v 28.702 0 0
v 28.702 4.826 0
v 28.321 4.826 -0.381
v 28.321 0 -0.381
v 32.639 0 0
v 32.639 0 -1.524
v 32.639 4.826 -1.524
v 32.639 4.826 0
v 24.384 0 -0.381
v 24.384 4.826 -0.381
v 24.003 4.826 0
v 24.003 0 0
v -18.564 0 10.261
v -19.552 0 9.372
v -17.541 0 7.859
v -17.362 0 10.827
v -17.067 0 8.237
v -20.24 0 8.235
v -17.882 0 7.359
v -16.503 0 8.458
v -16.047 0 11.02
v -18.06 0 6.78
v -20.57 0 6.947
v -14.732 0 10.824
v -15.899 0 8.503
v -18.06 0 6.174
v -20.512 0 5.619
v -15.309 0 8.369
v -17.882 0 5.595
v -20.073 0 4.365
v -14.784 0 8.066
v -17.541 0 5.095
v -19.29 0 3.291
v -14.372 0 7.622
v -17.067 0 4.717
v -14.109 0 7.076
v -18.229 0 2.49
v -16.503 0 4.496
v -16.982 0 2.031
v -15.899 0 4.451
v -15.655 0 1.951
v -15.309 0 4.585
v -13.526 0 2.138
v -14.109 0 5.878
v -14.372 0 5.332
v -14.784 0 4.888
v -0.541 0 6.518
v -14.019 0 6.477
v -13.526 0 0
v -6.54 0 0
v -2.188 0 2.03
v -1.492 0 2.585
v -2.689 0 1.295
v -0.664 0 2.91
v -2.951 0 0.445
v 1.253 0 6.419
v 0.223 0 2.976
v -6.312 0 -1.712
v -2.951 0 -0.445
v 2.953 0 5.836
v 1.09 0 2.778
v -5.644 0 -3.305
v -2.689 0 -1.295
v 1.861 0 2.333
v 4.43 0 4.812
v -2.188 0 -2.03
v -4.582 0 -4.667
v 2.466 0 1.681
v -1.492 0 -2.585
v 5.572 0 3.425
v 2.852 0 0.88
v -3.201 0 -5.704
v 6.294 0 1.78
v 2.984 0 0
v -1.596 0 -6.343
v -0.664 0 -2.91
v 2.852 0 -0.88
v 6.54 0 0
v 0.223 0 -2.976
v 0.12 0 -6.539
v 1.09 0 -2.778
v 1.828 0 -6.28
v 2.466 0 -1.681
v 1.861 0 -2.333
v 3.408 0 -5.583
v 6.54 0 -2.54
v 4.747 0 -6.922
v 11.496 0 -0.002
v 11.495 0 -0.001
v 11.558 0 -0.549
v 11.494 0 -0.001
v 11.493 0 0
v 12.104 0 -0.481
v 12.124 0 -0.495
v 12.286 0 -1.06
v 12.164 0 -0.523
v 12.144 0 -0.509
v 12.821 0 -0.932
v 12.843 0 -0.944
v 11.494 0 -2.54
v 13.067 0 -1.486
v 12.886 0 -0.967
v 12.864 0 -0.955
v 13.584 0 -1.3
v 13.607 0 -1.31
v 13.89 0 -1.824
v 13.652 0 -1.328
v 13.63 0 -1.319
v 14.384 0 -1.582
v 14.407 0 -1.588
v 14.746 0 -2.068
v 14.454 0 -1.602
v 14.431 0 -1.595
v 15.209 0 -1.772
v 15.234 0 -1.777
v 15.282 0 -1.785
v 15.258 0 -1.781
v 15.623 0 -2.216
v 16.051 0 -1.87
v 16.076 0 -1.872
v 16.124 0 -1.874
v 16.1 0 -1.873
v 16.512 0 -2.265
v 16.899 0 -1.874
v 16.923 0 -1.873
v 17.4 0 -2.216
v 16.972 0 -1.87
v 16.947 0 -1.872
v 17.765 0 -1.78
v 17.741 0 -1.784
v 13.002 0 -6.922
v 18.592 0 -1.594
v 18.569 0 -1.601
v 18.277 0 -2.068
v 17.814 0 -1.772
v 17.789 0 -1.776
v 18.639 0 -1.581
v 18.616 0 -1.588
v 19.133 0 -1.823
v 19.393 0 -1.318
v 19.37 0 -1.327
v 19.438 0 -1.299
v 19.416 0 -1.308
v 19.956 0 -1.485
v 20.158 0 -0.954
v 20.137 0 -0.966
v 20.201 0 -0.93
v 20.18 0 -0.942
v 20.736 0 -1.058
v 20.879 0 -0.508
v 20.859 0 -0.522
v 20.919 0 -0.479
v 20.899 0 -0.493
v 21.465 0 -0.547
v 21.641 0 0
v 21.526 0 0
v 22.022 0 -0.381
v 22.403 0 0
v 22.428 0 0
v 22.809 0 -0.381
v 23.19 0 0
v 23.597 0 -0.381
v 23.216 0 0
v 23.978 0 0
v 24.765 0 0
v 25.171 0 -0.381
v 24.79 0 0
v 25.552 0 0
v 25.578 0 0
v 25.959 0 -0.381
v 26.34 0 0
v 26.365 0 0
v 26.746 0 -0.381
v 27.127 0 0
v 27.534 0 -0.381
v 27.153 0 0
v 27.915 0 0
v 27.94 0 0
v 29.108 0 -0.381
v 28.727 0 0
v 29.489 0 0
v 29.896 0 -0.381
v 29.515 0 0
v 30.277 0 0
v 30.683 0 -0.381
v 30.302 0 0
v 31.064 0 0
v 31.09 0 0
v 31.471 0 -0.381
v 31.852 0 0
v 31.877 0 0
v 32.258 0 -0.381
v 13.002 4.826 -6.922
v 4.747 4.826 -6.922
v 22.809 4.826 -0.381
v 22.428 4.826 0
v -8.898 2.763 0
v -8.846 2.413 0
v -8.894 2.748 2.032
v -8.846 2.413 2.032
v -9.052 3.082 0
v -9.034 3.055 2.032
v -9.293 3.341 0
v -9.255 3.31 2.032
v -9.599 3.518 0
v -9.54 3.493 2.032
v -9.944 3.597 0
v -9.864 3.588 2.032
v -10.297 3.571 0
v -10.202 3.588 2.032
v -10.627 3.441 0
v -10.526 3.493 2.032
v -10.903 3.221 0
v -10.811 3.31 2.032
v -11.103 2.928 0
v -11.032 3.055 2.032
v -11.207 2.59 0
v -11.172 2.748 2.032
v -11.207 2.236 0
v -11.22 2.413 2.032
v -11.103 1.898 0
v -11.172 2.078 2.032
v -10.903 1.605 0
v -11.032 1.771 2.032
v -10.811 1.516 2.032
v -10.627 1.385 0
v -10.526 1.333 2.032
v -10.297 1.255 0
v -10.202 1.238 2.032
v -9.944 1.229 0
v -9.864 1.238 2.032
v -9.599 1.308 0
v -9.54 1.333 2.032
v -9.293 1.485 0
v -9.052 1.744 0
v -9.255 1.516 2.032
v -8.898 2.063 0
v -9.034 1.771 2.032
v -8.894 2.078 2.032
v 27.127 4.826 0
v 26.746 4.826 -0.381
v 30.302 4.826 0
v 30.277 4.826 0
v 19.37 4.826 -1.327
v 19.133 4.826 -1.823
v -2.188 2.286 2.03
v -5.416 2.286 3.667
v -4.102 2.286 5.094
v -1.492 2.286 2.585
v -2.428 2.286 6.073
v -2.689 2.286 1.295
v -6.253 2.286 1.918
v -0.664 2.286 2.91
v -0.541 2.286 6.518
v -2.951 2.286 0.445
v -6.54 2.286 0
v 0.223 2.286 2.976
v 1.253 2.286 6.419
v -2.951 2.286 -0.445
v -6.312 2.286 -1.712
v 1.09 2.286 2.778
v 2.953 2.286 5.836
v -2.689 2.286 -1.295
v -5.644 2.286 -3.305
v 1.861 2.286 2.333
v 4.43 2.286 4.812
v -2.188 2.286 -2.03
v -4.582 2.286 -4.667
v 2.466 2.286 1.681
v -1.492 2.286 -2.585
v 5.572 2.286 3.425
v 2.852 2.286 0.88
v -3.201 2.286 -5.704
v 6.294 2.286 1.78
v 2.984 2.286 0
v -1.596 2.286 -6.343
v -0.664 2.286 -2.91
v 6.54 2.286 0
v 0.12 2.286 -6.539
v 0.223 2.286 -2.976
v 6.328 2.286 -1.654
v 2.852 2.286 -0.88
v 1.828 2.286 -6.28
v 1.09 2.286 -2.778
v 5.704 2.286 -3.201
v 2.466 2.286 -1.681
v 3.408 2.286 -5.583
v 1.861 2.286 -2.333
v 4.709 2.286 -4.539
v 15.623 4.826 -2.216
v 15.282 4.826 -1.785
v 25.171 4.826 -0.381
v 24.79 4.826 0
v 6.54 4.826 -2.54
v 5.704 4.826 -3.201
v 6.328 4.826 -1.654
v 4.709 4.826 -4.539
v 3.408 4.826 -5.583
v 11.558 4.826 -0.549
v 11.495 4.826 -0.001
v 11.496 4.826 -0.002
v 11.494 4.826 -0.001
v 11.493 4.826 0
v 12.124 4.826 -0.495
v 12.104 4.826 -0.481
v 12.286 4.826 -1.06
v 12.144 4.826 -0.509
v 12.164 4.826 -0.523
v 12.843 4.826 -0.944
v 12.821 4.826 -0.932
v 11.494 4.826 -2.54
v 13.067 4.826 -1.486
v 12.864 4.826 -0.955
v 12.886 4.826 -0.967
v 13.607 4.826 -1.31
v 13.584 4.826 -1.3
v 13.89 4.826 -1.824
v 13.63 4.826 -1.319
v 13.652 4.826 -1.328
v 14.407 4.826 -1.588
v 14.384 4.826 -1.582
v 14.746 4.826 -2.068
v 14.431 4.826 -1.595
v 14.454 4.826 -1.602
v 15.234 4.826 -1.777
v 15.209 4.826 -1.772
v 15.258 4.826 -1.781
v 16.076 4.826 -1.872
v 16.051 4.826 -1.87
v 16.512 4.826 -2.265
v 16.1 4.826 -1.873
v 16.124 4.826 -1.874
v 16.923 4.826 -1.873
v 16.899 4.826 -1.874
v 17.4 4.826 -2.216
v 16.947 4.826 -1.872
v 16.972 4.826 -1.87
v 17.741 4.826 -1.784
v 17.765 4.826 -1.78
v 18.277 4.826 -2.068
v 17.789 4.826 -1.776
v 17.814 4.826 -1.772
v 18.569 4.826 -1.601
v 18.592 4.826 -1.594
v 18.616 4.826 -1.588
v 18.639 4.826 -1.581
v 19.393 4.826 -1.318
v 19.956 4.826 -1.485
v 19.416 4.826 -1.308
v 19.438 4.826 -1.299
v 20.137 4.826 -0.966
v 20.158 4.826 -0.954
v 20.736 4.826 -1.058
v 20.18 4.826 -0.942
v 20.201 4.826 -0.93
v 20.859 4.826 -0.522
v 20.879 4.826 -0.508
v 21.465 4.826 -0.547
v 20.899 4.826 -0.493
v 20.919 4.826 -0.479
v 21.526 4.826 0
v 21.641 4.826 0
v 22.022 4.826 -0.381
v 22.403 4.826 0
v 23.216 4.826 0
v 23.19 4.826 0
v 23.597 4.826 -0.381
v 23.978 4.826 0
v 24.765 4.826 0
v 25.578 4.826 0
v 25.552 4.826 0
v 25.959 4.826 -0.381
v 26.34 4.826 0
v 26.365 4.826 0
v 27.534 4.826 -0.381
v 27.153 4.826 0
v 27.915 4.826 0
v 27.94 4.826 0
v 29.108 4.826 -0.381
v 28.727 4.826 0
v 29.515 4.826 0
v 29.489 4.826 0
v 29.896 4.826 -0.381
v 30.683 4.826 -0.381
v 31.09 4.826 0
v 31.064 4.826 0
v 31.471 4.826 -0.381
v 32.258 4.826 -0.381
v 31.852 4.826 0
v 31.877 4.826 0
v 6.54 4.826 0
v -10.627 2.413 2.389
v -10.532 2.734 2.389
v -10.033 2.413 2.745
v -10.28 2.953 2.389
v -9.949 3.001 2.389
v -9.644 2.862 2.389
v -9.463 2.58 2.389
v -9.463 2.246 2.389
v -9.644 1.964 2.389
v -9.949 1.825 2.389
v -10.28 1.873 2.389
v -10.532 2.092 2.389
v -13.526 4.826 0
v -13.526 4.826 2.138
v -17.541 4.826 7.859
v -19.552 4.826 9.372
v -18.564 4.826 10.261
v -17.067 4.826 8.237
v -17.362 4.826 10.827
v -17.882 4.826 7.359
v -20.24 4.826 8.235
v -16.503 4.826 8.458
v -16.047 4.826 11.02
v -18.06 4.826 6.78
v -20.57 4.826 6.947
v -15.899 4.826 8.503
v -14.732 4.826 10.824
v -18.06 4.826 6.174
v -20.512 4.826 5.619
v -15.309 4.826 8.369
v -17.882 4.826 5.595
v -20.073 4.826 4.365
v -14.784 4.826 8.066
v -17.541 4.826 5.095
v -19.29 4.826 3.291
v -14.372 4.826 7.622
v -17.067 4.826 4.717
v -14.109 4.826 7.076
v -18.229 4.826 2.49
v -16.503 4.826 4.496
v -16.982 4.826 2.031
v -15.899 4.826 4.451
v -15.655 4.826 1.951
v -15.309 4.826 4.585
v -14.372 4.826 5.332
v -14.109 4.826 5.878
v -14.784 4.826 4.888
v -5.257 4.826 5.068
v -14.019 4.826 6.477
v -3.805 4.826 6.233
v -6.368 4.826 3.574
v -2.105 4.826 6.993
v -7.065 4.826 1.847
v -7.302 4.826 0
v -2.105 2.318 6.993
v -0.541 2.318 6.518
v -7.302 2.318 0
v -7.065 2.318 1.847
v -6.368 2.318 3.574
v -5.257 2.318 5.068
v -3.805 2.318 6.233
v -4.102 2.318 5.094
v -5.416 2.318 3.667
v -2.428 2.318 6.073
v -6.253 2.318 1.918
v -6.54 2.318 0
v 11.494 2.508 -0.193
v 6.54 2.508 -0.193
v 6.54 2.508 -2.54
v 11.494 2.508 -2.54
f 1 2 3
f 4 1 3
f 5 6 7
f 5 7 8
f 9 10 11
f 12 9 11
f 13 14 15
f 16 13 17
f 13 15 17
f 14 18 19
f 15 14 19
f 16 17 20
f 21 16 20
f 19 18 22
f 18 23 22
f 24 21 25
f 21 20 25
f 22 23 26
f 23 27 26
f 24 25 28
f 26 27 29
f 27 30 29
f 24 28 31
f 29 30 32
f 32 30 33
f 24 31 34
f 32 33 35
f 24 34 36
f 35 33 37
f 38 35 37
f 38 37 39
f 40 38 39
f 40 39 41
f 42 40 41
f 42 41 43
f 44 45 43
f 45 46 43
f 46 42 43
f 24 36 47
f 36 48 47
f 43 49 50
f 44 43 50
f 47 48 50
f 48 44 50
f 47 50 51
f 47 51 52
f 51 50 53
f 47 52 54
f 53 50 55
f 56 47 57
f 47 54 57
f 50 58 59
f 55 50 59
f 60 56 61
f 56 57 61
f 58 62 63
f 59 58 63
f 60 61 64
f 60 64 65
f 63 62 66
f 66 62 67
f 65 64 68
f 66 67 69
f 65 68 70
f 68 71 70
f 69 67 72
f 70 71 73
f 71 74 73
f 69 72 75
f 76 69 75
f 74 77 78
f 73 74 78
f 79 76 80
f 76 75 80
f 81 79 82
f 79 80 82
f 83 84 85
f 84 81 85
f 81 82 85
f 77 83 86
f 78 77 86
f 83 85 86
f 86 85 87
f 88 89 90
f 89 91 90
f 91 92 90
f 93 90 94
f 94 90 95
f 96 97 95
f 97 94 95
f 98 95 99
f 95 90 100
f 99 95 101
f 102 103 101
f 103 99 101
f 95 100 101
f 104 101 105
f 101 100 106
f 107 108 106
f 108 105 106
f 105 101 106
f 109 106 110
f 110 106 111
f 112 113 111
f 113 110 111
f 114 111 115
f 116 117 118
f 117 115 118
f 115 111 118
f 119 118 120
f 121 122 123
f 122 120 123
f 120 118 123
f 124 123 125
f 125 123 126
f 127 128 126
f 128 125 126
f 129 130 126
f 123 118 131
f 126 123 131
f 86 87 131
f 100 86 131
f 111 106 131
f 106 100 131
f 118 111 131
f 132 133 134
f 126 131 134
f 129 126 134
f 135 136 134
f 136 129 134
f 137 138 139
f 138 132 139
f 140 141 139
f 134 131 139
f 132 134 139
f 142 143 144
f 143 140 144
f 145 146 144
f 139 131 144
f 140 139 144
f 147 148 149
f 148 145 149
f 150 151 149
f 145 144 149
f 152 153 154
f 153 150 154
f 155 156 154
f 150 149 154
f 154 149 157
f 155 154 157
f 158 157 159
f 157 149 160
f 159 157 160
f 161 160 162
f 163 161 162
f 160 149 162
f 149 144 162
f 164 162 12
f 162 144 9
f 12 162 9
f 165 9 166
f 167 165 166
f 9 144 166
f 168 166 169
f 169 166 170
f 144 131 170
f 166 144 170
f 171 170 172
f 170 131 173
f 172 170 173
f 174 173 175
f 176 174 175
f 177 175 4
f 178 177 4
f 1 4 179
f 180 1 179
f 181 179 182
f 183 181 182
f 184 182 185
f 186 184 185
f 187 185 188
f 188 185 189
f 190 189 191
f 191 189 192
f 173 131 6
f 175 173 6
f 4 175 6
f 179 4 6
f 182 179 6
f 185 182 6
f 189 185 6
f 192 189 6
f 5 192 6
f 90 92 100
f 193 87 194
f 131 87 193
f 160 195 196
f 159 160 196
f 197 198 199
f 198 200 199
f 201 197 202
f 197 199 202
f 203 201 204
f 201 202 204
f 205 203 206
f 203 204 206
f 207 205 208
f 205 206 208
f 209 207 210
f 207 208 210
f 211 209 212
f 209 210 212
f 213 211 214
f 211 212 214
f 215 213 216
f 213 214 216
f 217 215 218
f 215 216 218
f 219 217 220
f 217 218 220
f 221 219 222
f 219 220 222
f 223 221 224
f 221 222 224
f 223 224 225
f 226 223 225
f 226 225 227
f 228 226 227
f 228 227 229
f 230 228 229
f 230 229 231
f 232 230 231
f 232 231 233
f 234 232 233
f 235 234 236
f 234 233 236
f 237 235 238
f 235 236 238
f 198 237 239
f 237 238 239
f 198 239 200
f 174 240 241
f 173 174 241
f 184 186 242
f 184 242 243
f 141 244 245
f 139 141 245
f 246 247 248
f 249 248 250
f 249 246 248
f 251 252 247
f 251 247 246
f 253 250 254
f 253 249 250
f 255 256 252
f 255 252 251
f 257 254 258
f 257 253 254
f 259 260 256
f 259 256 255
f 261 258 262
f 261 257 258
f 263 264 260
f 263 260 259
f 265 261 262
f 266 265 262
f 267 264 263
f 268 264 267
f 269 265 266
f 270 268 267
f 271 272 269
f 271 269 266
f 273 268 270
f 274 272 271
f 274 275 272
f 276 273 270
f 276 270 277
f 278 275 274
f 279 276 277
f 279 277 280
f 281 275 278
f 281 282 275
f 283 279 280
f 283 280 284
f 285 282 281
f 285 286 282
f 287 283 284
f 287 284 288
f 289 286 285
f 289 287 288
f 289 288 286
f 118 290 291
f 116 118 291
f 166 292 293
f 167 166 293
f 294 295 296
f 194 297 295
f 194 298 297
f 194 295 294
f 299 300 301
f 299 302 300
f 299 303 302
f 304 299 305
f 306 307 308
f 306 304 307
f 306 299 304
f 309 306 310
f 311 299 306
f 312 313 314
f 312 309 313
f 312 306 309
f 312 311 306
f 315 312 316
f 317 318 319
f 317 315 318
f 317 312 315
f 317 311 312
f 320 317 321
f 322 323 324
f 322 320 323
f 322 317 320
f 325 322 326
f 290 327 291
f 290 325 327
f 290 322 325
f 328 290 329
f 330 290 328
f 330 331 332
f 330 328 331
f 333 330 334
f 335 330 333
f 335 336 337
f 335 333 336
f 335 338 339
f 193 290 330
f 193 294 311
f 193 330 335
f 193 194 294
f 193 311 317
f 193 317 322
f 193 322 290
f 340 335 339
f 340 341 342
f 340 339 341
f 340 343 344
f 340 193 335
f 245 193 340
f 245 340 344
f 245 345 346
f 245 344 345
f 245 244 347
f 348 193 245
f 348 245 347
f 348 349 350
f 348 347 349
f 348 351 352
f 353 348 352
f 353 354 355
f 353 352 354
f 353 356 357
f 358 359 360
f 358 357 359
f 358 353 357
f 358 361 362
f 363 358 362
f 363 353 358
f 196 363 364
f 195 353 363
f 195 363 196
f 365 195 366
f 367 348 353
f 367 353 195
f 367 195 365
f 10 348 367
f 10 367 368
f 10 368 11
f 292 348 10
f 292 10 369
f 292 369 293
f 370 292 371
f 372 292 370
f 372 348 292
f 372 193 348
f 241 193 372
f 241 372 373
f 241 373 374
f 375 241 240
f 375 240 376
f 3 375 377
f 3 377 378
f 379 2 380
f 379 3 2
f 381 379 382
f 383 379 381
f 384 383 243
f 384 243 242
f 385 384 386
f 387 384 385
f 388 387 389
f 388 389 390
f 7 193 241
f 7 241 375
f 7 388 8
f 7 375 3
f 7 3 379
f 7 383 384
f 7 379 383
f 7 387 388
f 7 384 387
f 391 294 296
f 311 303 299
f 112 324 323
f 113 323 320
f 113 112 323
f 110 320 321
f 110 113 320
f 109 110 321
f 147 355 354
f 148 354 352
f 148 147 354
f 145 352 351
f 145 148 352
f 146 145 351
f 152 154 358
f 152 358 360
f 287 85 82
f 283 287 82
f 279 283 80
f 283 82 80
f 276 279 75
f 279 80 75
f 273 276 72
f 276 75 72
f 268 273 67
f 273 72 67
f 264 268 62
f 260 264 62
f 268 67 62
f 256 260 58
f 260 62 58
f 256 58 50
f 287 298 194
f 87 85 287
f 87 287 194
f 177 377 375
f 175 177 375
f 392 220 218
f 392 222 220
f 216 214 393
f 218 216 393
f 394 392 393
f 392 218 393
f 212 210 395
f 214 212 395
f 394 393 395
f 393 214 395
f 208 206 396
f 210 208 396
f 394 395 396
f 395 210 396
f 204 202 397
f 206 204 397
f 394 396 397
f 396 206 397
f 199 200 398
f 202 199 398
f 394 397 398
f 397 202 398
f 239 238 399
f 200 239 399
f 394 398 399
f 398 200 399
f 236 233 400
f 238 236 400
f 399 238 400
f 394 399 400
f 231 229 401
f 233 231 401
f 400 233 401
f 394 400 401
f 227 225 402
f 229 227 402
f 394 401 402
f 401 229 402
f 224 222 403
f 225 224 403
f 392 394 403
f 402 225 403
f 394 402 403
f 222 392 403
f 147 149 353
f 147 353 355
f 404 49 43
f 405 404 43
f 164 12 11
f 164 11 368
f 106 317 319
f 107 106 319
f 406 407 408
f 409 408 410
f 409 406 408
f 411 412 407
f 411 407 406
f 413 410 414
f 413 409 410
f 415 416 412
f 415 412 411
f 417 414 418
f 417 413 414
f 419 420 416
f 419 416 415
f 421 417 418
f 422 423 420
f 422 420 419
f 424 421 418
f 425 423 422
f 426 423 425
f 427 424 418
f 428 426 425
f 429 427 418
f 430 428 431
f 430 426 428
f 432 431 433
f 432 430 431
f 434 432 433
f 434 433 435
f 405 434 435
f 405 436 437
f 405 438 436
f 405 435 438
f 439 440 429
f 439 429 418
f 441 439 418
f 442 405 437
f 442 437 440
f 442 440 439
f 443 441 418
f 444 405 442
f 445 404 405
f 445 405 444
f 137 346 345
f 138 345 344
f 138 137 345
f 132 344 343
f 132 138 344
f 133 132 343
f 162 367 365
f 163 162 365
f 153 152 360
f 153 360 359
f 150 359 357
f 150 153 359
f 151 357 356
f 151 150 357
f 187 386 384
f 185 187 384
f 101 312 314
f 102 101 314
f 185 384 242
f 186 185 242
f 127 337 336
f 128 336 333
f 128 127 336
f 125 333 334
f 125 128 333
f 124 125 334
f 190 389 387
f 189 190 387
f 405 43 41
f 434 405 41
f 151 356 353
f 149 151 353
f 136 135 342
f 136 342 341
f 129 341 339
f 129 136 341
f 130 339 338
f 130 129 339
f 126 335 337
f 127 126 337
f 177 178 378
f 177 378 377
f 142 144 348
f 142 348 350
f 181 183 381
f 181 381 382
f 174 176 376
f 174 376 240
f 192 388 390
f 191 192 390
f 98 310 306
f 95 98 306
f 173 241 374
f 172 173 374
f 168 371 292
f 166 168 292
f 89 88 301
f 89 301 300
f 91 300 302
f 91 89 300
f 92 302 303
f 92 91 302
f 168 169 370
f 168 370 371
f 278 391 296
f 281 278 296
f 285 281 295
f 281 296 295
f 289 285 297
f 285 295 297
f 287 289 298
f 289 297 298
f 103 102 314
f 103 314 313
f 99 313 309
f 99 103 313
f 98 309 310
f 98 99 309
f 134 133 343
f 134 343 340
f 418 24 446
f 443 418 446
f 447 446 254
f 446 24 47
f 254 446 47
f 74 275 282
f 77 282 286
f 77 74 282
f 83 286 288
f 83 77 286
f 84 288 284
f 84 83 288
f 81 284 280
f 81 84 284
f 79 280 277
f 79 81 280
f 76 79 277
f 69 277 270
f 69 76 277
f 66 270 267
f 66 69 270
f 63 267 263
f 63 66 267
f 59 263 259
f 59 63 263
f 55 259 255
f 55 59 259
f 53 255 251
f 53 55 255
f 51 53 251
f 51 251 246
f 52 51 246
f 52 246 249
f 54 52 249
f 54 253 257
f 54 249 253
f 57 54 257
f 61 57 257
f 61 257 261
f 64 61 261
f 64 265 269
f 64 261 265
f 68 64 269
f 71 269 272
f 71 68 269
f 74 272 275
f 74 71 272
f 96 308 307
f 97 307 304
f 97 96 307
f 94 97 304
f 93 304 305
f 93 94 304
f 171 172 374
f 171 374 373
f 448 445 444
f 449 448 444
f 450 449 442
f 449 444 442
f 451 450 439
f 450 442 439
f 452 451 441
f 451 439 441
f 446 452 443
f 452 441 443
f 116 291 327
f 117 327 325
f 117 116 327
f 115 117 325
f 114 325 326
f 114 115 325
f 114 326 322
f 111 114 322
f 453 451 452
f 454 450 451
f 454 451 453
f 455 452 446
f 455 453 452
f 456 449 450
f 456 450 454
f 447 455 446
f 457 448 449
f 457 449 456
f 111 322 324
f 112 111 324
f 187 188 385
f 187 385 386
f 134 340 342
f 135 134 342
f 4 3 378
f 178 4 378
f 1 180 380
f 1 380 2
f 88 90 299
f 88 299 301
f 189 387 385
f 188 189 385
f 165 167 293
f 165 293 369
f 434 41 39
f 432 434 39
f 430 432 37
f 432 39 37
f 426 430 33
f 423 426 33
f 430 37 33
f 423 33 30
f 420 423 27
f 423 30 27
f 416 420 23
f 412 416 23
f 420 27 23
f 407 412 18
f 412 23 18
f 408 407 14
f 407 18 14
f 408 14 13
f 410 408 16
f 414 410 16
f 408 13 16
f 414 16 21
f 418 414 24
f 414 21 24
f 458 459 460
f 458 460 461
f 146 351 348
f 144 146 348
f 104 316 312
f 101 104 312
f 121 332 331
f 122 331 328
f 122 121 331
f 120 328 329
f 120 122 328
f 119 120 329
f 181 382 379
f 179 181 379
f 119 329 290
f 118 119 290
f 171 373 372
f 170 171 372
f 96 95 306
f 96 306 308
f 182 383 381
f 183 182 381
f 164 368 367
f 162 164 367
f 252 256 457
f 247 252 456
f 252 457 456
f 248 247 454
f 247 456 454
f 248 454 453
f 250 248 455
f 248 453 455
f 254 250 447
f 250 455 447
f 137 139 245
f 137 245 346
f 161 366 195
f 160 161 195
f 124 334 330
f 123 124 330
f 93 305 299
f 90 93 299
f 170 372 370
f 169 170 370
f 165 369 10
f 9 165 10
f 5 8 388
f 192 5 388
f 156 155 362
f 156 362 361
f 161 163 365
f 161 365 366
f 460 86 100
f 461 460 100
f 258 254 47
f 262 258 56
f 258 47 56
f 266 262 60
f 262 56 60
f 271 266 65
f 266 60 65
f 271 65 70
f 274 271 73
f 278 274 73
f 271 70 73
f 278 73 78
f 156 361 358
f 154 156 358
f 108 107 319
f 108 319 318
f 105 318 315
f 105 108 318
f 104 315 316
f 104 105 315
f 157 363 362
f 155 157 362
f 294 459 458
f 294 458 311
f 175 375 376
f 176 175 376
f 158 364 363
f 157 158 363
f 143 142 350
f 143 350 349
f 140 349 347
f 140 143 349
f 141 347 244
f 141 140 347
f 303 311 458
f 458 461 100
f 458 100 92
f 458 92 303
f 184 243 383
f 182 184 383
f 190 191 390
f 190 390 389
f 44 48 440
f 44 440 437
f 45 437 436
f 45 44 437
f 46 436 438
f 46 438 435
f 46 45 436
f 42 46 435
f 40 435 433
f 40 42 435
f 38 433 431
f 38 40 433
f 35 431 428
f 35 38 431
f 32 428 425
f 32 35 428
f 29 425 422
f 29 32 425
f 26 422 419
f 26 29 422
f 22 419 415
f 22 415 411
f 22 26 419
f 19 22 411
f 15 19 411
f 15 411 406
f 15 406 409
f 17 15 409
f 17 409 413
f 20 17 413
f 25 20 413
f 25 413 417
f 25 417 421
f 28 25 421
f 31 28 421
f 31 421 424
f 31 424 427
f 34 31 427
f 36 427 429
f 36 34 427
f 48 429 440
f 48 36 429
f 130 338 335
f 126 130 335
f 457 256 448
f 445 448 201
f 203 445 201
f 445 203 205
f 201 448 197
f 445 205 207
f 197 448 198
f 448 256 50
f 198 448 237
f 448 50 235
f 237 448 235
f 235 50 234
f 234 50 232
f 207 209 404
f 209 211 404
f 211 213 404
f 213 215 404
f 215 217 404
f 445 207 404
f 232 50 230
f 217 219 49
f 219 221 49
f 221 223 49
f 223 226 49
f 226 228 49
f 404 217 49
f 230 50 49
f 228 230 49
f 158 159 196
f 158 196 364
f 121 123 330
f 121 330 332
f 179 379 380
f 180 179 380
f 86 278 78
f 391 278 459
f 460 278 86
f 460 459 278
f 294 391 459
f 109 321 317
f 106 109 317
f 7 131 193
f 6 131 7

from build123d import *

# Parameters (mm, degrees)
SKETCH1_R                        = 6.5405
SKETCH1_R_2                      = 2.9845
BOSS_EXTRUDE1_DEPTH              = 4.826
SKETCH2_R                        = 2.032
BOSS_EXTRUDE2_DEPTH              = 4.826
F_42_0_0935_DIAMETER_HOLE1_D     = 2.3749
F_42_0_0935_DIAMETER_HOLE1_DEPTH = 2.032
F_42_0_0935_DIAMETER_HOLE1_TIP   = 0.713491942
BOSS_EXTRUDE3_DEPTH              = 4.826
CUT_EXTRUDE1_DEPTH               = 2.50825
CUT_EXTRUDE2_DEPTH               = 5.826
LPATTERN1_COUNT                  = 14
LPATTERN1_PITCH                  = 0.7874
CUT_EXTRUDE3_DEPTH               = 5.826
CIRPATTERN1_COUNT                = 13
CIRPATTERN1_ANGLE                = 76.5
SKETCH13_W                       = 4.953
SKETCH13_H                       = 2.54
CUT_EXTRUDE5_DEPTH               = 2.50825
BOSS_EXTRUDE4_REACH              = 28.099
SKETCH15_W                       = 4.953
SKETCH15_H                       = 2.54
CUT_EXTRUDE6_DEPTH               = 2.50825
SKETCH16_R                       = 6.5405
CUT_EXTRUDE7_DEPTH               = 2.54


with BuildPart() as part:
    # Sketch1 → Boss-Extrude1 (new body)
    with BuildSketch(Plane(origin=(0, 0, 0), x_dir=(1, 0, 0), z_dir=(0, 1, 0))):
        Circle(SKETCH1_R)
        Circle(SKETCH1_R_2, mode=Mode.SUBTRACT)
    extrude(amount=BOSS_EXTRUDE1_DEPTH)

    # Sketch2 → Boss-Extrude2 (add)
    with BuildSketch(Plane(origin=(0, 0, 0), x_dir=(1, 0, 0), z_dir=(0, 1, 0))):
        with BuildLine():
            Line((-6.5405, 0), (-13.5255, 0))
            Line((-13.5255, 0), (-13.5255, -2.137742196))
            Line((-13.5255, -2.137742196), (-15.655107442, -1.951425687))
            ThreePointArc((-15.655107442, -1.951425687), (-20.569516848, -6.947096437), (-14.732, -10.824149842))
            Line((-14.732, -10.824149842), (-0.540673648, -6.518114164))
            ThreePointArc((-0.540673648, -6.518114164), (-4.812193691, -4.429552136), (-6.5405, 0))
        make_face()
        with Locations((-16.05104389, -6.477)):
            Circle(SKETCH2_R, mode=Mode.SUBTRACT)
    extrude(amount=BOSS_EXTRUDE2_DEPTH)

    # #42 (0.0935) Diameter Hole1
    with Locations(Plane(origin=(0, 0, 0), x_dir=(-1, 0, 0), z_dir=(0, 0, -1))):
        with Locations((10.033, 2.413)):
            Hole(F_42_0_0935_DIAMETER_HOLE1_D / 2, depth=F_42_0_0935_DIAMETER_HOLE1_DEPTH)
            with Locations((0, 0, -(F_42_0_0935_DIAMETER_HOLE1_DEPTH + F_42_0_0935_DIAMETER_HOLE1_TIP / 2))):  # 118° drill point
                Cone(0, F_42_0_0935_DIAMETER_HOLE1_D / 2, F_42_0_0935_DIAMETER_HOLE1_TIP, mode=Mode.SUBTRACT)

    # Sketch8 → Boss-Extrude3 (add)
    with BuildSketch(Plane(origin=(0, 0, 0), x_dir=(1, 0, 0), z_dir=(0, 1, 0))):
        with BuildLine():
            Line((13.001568547, 6.9215), (32.639, 1.524))
            Line((32.639, 1.524), (32.639, 0))
            Line((32.639, 0), (21.5265, 0))
            ThreePointArc((21.5265, 0), (16.51, 1.884223876), (11.4935, 0))
            Line((11.4935, 0), (6.5405, 0))
            ThreePointArc((6.5405, 0), (5.703778696, 3.200788783), (3.407697053, 5.582628507))
            Line((3.407697053, 5.582628507), (4.746568547, 6.9215))
            Line((4.746568547, 6.9215), (13.001568547, 6.9215))
        make_face()
    extrude(amount=BOSS_EXTRUDE3_DEPTH)

    # Sketch9 → Cut-Extrude1 (cut)
    with BuildSketch(Plane(origin=(0, 4.826, 0), x_dir=(1, 0, 0), z_dir=(0, 1, 0))):
        with BuildLine():
            ThreePointArc((-7.3025, 0), (-5.860688184, -4.356471079), (-2.10459784, -6.992651442))
            Line((-2.10459784, -6.992651442), (-0.540673648, -6.518114164))
            ThreePointArc((-0.540673648, -6.518114164), (-4.812193691, -4.429552136), (-6.5405, 0))
            Line((-6.5405, 0), (-7.3025, 0))
        make_face()
    extrude(amount=-CUT_EXTRUDE1_DEPTH, mode=Mode.SUBTRACT)

    # Sketch10 → Cut-Extrude2 (cut, through all)
    with BuildSketch(Plane(origin=(0, 4.826, 0), x_dir=(1, 0, 0), z_dir=(0, 1, 0))):
        Polygon((32.639, 0), (32.258, 0.381), (31.877, 0), align=None)
    cut_extrude2 = extrude(amount=-CUT_EXTRUDE2_DEPTH, mode=Mode.SUBTRACT)

    # LPattern1: Cut-Extrude2 ×14
    with Locations(*[(-i * LPATTERN1_PITCH, 0, 0) for i in range(1, LPATTERN1_COUNT)]):
        add(cut_extrude2, mode=Mode.SUBTRACT)

    # Sketch11 → Cut-Extrude3 (cut, through all)
    with BuildSketch(Plane(origin=(0, 4.826, 0), x_dir=(1, 0, 0), z_dir=(0, 1, 0))):
        with BuildLine():
            Line((21.5265, 0), (21.464606941, 0.546569859))
            Line((21.464606941, 0.546569859), (20.918663717, 0.47937345))
            ThreePointArc((20.918663717, 0.47937345), (21.228673277, 0.247410527), (21.5265, 0))
        make_face()
    cut_extrude3 = extrude(amount=-CUT_EXTRUDE3_DEPTH, mode=Mode.SUBTRACT)

    # CirPattern1: Cut-Extrude3 ×13 about axis
    cirpattern1_axis = Axis((16.51, 0, 5.735776124), (0, 1, 0))
    for i in range(1, CIRPATTERN1_COUNT):
        add(cut_extrude3.rotate(cirpattern1_axis, i * CIRPATTERN1_ANGLE / (CIRPATTERN1_COUNT - 1)), mode=Mode.SUBTRACT)

    # Sketch13 → Cut-Extrude5 (cut)
    with BuildSketch(Plane(origin=(0, 4.826, 0), x_dir=(1, 0, 0), z_dir=(0, 1, 0))):
        with Locations((9.017, 1.27)):
            Rectangle(SKETCH13_W, SKETCH13_H)
    extrude(amount=-CUT_EXTRUDE5_DEPTH, mode=Mode.SUBTRACT)

    # Sketch14 → Boss-Extrude4 (add, up to next)
    with BuildSketch(Plane(origin=(6.5405, 0, 0), x_dir=(0, 0, -1), z_dir=(1, 0, 0)), mode=Mode.PRIVATE) as boss_extrude4_sk1:
        Polygon((0, 2.31775), (2.54, 4.826), (2.54, 2.31775), align=None)
    boss_extrude4_tool1 = extrude(boss_extrude4_sk1.sketch, amount=BOSS_EXTRUDE4_REACH, mode=Mode.PRIVATE) - part.part
    add(boss_extrude4_tool1.solids().sort_by_distance((6.5405, 3.153833, -1.693333))[0])

    # Sketch15 → Cut-Extrude6 (cut)
    with BuildSketch(Plane.XZ):
        with Locations((9.017, -1.27)):
            Rectangle(SKETCH15_W, SKETCH15_H)
    extrude(amount=-CUT_EXTRUDE6_DEPTH, mode=Mode.SUBTRACT)

    # Sketch16 → Cut-Extrude7 (cut)
    with BuildSketch(Plane(origin=(0, 4.826, 0), x_dir=(1, 0, 0), z_dir=(0, 1, 0))):
        Circle(SKETCH16_R)
    extrude(amount=-CUT_EXTRUDE7_DEPTH, mode=Mode.SUBTRACT)


solid = part.part
